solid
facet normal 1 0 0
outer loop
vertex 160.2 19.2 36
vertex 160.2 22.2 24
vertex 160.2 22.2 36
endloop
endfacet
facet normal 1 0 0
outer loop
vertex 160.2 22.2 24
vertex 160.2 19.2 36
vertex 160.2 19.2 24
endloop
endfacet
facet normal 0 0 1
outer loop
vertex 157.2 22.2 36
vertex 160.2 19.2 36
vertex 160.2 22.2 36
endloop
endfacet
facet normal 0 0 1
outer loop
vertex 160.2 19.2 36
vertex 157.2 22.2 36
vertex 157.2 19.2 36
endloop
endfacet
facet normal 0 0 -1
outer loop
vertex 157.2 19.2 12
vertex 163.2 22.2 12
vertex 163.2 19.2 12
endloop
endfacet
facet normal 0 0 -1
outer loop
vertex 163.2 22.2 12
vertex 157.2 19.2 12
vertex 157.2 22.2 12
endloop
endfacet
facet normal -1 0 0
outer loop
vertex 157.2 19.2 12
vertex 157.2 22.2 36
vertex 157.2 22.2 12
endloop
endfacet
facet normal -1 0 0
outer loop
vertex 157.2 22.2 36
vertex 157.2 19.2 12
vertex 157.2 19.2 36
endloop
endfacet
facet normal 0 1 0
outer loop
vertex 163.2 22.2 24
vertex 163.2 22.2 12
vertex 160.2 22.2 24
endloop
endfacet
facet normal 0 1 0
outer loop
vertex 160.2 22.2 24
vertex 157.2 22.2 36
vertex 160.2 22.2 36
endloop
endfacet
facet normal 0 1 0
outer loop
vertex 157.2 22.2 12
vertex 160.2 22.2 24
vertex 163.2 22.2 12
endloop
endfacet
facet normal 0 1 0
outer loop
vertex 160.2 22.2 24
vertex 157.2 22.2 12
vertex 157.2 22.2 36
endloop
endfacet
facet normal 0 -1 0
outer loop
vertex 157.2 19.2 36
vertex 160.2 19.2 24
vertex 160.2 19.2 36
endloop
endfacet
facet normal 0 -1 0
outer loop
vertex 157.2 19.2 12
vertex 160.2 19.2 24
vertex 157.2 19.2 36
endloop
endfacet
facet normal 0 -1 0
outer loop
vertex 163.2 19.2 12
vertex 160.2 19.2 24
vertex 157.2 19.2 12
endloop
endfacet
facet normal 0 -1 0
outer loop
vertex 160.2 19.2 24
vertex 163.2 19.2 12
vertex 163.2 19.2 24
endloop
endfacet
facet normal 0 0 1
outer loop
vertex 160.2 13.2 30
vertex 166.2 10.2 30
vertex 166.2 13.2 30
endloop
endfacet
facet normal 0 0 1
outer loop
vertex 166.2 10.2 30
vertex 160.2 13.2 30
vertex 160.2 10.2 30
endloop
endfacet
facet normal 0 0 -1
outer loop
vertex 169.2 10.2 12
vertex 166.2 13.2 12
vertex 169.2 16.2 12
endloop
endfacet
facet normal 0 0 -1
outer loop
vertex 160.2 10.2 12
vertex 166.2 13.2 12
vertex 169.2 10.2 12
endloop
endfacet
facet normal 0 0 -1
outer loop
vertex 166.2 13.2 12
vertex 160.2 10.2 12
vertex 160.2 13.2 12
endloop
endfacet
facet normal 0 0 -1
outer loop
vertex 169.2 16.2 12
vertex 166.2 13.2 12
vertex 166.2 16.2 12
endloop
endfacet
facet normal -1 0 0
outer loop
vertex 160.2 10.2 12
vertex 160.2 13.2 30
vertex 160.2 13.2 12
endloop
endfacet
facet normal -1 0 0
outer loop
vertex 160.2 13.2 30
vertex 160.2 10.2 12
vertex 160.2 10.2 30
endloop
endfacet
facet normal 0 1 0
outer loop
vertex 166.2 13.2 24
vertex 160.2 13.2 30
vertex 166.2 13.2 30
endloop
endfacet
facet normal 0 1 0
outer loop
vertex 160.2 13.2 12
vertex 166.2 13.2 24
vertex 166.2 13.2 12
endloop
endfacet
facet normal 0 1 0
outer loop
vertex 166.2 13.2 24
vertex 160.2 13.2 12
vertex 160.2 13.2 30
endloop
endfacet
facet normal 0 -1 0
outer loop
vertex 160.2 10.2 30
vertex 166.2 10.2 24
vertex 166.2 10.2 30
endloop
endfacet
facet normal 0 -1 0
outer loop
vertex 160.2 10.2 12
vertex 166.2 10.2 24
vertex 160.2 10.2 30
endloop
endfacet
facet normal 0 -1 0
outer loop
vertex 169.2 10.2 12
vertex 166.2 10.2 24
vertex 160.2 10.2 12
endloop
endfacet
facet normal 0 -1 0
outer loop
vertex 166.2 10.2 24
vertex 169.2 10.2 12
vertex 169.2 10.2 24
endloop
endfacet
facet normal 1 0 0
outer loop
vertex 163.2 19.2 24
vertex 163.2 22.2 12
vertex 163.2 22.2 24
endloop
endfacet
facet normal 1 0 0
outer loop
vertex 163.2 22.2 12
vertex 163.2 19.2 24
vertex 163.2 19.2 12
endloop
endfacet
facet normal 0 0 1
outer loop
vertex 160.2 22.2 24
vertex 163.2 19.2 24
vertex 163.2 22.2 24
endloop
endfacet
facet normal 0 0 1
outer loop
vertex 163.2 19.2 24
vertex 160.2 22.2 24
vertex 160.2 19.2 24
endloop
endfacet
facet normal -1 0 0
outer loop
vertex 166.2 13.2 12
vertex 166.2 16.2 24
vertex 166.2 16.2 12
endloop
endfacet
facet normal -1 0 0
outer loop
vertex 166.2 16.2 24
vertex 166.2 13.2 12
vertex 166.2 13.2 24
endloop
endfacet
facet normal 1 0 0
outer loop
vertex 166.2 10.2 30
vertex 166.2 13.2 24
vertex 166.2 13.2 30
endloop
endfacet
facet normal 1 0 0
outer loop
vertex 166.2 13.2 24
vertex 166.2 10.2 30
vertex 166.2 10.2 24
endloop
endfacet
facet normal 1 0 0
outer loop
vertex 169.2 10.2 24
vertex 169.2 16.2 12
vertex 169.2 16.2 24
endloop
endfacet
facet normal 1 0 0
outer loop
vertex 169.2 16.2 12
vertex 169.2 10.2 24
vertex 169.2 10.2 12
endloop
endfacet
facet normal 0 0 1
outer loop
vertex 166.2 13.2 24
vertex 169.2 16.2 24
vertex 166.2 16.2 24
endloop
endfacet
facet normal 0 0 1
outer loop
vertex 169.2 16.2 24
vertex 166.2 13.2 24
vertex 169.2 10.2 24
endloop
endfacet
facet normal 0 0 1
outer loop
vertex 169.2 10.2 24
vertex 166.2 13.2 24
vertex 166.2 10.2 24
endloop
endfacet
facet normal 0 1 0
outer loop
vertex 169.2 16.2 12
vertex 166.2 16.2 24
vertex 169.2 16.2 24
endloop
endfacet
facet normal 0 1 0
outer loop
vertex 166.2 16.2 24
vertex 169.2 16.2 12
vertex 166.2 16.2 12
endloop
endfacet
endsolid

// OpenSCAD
union() {
	translate(v = [157.2, 19.200000000000003, 12.0]) {
		cube(size = [3.0, 3.0, 24.0]);
	}
	translate(v = [160.2, 10.200000000000001, 12.0]) {
		cube(size = [3.0, 3.0, 18.0]);
	}
	translate(v = [160.2, 19.200000000000003, 12.0]) {
		cube(size = [3.0, 3.0, 12.0]);
	}
	translate(v = [163.2, 10.200000000000001, 12.0]) {
		cube(size = [3.0, 3.0, 18.0]);
	}
	translate(v = [166.2, 10.200000000000001, 12.0]) {
		cube(size = [3.0, 3.0, 12.0]);
	}
	translate(v = [166.2, 13.200000000000001, 12.0]) {
		cube(size = [3.0, 3.0, 12.0]);
	}
}
